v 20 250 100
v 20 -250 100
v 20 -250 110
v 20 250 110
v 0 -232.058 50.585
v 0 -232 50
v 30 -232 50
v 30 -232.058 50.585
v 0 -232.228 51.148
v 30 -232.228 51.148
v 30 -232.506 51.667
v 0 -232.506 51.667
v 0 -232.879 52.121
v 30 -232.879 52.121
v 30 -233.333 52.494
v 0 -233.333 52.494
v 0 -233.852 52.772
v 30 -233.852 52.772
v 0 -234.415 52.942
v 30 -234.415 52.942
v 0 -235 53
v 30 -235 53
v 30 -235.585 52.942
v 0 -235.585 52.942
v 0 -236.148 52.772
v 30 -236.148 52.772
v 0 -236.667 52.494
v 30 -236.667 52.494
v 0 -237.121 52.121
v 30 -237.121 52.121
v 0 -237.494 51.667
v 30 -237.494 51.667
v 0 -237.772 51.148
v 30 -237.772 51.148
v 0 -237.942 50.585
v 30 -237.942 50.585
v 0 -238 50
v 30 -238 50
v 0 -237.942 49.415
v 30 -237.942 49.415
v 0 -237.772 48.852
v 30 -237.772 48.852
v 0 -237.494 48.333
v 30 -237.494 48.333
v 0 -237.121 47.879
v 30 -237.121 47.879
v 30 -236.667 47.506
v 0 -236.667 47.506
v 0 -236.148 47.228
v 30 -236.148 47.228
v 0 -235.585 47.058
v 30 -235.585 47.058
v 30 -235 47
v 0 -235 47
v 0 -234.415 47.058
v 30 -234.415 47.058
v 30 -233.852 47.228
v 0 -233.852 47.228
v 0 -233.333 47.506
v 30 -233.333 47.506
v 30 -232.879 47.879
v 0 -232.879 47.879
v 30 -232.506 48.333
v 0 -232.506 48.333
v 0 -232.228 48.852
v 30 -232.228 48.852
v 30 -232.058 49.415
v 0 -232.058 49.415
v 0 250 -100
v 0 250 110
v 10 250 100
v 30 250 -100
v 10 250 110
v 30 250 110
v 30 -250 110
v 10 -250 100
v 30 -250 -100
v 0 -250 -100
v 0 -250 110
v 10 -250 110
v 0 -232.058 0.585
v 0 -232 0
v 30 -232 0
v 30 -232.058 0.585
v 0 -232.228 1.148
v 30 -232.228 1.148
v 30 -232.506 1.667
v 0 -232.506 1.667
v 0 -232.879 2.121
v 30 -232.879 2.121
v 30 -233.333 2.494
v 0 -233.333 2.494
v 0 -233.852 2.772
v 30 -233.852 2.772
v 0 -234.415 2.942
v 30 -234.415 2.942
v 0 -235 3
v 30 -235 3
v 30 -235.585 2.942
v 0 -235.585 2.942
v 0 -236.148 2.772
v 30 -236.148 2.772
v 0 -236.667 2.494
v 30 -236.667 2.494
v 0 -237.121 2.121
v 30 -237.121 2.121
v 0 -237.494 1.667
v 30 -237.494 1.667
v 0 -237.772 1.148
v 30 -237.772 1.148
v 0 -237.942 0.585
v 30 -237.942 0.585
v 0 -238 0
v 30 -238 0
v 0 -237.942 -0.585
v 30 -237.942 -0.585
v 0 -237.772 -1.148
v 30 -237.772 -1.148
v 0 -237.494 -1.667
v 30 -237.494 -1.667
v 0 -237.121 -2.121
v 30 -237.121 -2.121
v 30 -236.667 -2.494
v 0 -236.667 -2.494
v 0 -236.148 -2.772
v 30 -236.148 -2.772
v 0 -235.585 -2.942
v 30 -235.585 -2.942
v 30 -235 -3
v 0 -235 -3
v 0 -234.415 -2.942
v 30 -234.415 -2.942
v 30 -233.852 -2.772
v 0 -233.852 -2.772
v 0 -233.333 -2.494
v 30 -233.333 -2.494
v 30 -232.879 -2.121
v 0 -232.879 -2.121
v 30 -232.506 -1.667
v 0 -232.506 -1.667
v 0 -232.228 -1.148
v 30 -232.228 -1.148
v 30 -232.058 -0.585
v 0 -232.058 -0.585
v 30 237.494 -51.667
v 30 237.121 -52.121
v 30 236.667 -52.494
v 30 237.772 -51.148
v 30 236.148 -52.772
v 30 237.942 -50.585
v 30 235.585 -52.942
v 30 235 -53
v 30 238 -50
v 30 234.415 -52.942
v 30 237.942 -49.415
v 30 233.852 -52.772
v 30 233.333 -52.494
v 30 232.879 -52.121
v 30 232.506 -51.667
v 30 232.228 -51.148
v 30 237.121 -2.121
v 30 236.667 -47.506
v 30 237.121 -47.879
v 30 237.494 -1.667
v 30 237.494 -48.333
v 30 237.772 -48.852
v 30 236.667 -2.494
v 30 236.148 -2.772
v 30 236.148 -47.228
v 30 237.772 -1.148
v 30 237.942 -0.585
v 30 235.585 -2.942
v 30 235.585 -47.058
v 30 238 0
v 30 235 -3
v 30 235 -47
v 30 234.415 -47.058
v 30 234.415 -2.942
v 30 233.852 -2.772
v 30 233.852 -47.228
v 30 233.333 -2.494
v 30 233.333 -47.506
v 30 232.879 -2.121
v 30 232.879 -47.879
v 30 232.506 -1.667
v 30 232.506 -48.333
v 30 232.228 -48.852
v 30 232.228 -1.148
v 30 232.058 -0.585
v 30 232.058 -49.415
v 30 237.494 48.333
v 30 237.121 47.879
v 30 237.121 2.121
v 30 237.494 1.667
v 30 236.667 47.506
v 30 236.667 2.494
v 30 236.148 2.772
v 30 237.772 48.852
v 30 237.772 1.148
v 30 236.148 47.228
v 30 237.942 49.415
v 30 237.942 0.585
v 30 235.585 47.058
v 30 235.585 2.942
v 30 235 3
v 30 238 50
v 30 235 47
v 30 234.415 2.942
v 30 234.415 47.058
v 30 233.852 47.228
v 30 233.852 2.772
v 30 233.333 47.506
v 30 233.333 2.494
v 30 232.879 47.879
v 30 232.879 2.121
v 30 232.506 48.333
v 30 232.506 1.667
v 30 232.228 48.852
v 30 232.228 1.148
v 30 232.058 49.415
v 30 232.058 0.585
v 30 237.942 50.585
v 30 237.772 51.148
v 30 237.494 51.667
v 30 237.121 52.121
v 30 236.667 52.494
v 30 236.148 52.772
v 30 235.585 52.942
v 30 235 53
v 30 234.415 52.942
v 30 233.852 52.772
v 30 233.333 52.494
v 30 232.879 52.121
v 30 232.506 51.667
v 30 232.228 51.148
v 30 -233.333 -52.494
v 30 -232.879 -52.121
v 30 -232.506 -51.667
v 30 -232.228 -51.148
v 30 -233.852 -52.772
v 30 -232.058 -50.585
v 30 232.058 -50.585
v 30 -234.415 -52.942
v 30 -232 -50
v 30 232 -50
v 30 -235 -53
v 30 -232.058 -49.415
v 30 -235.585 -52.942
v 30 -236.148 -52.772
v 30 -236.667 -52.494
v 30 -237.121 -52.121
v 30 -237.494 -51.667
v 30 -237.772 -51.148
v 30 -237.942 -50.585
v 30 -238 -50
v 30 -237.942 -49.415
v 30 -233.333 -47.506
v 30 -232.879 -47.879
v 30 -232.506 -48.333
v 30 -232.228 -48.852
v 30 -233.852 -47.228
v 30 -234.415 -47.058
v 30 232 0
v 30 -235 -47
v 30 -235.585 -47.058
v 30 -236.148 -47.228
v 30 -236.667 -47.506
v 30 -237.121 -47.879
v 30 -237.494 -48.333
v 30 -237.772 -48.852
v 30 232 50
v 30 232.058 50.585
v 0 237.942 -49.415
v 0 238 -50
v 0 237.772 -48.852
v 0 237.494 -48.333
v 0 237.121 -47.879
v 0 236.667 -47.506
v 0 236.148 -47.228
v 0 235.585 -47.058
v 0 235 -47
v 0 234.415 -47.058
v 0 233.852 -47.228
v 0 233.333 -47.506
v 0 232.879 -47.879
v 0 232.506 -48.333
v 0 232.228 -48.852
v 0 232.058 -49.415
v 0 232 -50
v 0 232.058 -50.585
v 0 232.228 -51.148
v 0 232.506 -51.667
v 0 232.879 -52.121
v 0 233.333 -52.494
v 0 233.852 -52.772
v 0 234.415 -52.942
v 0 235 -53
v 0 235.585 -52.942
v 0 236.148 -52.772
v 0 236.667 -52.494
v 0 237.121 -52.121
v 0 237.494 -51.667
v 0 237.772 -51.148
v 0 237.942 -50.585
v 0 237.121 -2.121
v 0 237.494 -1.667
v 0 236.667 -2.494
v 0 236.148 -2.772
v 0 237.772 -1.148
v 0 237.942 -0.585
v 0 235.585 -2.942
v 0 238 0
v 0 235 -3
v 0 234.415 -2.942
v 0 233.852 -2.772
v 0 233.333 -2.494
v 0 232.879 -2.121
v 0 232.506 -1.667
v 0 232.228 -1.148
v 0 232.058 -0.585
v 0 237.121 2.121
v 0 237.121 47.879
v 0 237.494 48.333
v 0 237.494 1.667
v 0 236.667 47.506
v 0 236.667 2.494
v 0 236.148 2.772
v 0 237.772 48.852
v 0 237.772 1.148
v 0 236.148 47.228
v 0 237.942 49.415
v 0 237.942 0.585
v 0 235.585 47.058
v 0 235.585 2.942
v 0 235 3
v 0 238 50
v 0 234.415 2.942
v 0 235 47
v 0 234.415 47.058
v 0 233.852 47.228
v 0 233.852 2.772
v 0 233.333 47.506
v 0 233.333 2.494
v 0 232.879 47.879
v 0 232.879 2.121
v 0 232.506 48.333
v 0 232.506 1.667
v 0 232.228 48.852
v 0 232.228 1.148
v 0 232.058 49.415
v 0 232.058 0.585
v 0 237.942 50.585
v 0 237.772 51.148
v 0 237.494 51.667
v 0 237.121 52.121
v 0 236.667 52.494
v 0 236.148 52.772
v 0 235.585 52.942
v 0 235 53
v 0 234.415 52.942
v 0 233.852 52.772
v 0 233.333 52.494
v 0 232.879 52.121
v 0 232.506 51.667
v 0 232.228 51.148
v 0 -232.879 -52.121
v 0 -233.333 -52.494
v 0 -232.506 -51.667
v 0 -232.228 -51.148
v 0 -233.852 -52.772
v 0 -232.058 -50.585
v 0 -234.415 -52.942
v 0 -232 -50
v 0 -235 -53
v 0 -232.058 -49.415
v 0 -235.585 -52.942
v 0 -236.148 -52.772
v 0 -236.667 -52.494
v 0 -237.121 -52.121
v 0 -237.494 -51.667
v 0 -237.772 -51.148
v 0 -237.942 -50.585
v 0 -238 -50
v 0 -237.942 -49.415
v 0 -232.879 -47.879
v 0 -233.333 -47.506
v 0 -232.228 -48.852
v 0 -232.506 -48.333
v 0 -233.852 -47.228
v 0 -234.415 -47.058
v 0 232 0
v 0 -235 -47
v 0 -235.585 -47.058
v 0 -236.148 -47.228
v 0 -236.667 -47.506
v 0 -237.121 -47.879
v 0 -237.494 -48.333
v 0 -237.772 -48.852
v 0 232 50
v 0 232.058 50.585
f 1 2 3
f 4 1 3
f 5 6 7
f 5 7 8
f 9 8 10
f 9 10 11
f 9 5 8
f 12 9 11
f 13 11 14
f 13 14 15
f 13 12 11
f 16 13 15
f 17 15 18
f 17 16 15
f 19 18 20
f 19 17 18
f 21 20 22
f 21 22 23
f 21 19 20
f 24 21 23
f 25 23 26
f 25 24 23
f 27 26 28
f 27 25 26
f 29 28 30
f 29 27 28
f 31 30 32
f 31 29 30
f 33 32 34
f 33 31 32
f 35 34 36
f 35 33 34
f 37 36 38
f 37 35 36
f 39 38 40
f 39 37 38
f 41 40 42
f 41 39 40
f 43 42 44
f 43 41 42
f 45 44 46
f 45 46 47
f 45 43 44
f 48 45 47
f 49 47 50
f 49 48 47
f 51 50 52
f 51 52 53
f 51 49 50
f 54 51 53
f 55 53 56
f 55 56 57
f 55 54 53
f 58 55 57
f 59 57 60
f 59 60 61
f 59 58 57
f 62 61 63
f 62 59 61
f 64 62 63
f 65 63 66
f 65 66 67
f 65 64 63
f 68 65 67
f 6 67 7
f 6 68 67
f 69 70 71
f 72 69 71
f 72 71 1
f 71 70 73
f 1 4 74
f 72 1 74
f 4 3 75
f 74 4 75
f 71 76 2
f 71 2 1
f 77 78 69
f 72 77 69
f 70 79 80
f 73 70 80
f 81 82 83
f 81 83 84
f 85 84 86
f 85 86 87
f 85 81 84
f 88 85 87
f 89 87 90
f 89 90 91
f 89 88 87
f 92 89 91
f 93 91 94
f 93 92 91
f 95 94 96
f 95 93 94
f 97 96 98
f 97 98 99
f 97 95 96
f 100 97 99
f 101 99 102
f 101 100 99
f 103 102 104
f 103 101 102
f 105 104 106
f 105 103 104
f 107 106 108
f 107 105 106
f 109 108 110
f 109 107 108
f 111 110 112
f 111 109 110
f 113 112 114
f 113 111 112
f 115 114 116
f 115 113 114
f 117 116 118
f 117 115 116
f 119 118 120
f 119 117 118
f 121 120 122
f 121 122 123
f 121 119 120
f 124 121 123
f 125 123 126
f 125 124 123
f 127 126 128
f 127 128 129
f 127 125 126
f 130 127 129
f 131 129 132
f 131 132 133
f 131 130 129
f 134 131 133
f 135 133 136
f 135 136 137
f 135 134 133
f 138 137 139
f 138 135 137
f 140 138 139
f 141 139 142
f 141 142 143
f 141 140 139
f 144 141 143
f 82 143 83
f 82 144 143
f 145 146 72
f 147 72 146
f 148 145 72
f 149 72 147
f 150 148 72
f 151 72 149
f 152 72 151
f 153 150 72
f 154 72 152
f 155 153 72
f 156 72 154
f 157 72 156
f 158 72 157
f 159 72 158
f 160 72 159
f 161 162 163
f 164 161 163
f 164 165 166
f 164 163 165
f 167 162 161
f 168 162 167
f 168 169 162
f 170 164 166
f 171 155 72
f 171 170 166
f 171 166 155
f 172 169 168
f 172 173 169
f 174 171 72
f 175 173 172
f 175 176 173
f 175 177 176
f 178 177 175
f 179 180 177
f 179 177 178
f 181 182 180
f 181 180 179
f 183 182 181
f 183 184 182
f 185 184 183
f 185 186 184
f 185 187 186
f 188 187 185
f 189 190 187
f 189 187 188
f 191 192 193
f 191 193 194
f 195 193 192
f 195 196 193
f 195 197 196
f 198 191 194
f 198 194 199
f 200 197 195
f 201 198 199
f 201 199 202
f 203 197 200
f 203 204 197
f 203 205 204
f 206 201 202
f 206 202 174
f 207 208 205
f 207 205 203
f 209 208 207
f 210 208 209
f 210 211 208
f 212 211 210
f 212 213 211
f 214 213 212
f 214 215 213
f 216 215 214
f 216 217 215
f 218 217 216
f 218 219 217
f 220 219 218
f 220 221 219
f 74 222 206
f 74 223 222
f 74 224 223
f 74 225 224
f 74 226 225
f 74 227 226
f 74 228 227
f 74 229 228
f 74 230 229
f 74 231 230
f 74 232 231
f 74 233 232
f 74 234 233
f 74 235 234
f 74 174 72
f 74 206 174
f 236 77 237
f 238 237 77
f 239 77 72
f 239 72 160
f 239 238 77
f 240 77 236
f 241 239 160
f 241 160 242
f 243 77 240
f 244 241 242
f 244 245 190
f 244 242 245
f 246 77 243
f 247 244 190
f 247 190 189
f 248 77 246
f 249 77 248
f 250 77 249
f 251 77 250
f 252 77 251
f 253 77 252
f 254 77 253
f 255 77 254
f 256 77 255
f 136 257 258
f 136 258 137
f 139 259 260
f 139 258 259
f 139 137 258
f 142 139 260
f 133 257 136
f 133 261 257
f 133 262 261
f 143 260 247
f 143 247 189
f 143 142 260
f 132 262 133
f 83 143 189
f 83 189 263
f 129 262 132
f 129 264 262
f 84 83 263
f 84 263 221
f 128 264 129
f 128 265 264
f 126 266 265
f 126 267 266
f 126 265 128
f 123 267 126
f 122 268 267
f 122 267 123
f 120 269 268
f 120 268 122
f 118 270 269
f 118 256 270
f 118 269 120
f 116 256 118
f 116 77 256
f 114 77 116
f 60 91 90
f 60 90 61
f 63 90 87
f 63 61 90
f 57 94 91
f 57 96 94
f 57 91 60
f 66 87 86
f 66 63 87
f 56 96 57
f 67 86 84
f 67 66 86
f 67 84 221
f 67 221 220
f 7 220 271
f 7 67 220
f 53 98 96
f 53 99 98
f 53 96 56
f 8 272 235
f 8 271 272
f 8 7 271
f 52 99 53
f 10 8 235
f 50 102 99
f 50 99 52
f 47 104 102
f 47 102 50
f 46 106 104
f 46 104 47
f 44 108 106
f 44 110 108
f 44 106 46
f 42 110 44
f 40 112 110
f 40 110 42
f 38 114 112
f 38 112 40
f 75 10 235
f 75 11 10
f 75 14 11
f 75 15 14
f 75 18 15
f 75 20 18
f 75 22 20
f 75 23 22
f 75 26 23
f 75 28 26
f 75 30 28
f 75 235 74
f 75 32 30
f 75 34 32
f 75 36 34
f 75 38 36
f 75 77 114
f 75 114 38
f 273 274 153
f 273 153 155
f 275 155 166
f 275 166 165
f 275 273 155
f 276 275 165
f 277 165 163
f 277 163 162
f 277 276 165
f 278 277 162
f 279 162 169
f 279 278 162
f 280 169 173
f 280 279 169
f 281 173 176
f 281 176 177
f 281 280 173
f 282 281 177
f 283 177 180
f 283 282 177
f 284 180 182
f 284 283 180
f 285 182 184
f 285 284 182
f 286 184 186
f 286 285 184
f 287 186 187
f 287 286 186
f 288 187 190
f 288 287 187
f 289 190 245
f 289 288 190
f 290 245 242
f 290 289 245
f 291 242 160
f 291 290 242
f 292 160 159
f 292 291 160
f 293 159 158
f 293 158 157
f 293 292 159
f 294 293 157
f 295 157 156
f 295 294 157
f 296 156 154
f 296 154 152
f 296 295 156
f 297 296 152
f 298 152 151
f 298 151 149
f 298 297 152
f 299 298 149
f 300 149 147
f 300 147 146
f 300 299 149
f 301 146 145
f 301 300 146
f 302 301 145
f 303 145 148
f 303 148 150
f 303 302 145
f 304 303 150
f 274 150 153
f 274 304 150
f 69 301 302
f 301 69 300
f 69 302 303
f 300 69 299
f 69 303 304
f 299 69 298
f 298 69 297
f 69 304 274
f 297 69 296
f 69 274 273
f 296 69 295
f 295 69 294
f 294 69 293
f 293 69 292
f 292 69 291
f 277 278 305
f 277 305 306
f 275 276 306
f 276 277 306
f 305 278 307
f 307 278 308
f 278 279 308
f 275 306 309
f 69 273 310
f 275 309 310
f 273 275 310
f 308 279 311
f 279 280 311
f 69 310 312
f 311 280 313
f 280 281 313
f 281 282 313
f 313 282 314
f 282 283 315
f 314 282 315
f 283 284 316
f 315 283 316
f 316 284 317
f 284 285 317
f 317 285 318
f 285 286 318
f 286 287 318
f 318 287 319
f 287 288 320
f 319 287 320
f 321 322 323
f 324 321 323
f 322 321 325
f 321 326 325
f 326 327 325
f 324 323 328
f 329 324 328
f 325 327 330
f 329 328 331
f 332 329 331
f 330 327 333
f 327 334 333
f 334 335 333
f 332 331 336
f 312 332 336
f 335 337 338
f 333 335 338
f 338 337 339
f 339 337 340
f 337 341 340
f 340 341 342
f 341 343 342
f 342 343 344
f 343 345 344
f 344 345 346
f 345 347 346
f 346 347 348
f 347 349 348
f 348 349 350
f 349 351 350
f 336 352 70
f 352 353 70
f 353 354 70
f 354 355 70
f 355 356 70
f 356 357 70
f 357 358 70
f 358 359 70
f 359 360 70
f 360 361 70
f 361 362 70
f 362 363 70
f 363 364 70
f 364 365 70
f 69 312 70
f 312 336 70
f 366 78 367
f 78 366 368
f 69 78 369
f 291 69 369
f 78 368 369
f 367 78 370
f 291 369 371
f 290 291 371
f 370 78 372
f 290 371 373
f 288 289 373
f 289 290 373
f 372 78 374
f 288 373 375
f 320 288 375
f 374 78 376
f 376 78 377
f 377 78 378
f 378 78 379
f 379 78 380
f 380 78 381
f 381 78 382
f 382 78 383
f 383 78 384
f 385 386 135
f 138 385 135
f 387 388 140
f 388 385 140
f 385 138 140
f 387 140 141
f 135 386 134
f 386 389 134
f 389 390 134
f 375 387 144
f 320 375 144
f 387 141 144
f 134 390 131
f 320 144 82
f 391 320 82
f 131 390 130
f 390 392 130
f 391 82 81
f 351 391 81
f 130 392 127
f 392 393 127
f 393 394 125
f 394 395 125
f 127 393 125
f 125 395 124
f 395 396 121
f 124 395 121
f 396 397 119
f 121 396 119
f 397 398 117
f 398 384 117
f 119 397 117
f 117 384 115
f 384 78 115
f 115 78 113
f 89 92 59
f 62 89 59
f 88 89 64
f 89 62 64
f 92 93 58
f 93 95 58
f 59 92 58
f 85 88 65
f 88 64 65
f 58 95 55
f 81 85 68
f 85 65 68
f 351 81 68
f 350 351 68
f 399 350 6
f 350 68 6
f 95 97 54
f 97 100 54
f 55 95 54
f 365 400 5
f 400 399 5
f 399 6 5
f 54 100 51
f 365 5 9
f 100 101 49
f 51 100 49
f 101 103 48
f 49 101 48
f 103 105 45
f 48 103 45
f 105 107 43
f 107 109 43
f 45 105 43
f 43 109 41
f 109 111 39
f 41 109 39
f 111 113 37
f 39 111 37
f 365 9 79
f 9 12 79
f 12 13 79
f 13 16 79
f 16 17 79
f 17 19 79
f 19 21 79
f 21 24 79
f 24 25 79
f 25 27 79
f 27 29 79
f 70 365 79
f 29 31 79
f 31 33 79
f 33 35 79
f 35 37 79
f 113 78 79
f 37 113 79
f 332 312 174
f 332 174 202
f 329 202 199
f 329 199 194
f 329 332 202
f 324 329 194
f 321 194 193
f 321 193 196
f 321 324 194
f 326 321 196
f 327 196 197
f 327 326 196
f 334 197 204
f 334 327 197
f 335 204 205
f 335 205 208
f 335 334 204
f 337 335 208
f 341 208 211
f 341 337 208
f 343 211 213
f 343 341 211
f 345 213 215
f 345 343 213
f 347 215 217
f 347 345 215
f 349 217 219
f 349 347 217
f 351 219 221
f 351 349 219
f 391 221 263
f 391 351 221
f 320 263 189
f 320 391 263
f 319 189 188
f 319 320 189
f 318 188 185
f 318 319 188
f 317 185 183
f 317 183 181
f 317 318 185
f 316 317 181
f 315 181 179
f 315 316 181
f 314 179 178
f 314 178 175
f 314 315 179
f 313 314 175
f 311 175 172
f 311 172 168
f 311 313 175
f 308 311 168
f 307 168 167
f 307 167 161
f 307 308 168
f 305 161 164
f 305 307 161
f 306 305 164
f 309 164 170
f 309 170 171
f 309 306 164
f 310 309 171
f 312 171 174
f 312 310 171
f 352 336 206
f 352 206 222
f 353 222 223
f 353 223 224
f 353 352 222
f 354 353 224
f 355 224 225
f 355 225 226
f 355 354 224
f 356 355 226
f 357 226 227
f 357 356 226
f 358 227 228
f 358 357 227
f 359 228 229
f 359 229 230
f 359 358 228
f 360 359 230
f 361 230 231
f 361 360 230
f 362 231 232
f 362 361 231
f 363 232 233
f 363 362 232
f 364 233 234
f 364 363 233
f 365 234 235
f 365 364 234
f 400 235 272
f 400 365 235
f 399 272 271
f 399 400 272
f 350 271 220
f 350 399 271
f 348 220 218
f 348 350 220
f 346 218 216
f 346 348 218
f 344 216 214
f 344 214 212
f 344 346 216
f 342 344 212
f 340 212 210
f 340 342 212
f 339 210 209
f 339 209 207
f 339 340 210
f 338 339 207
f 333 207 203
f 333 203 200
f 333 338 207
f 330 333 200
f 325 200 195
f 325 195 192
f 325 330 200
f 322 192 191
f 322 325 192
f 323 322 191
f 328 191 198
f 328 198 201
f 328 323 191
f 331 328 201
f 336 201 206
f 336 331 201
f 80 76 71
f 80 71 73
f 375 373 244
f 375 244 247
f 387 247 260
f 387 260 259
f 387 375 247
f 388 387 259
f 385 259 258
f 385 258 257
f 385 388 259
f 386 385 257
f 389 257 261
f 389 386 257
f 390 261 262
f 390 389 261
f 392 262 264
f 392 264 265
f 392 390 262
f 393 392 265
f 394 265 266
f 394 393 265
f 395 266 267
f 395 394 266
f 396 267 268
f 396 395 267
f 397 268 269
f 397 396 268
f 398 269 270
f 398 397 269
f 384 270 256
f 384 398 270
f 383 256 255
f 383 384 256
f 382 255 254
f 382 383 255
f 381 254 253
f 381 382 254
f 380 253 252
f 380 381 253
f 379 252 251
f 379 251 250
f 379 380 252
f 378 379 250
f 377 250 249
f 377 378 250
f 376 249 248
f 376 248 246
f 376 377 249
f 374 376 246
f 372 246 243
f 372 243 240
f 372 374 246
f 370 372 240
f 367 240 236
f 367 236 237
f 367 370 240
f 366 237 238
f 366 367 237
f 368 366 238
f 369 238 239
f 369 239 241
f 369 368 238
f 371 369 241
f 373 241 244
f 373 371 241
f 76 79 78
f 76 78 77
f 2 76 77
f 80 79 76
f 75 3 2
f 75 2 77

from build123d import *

# Parameters (mm, degrees)
F0_W     = 500
F0_H     = 200
F0_R     = 3
F1_DEPTH = 30
F2_W     = 10
F2_H     = 10
F3_DEPTH = 500
F4_W     = 10
F4_H     = 10
F5_DEPTH = 500


with BuildPart() as f1:
    # F0 (on Right) → F1 (new body)
    with BuildSketch(Plane.YZ):
        Rectangle(F0_W, F0_H)
        with Locations((-235, -50)):
            Circle(F0_R, mode=Mode.SUBTRACT)
        with Locations((235, -50)):
            Circle(F0_R, mode=Mode.SUBTRACT)
        with Locations((-235, 0)):
            Circle(F0_R, mode=Mode.SUBTRACT)
        with Locations((-235, 50)):
            Circle(F0_R, mode=Mode.SUBTRACT)
        with Locations((235, 0)):
            Circle(F0_R, mode=Mode.SUBTRACT)
        with Locations((235, 50)):
            Circle(F0_R, mode=Mode.SUBTRACT)
    extrude(amount=F1_DEPTH)

    # F2 (on face) → F3 (join)
    with BuildSketch(Plane.XZ.offset(250)):
        with Locations((5, 105)):
            Rectangle(F2_W, F2_H)
    extrude(amount=-F3_DEPTH)

    # F4 (on face) → F5 (join)
    with BuildSketch(Plane.XZ.offset(250)):
        with Locations((25, 105)):
            Rectangle(F4_W, F4_H)
    extrude(amount=-F5_DEPTH)


solid = f1.part
